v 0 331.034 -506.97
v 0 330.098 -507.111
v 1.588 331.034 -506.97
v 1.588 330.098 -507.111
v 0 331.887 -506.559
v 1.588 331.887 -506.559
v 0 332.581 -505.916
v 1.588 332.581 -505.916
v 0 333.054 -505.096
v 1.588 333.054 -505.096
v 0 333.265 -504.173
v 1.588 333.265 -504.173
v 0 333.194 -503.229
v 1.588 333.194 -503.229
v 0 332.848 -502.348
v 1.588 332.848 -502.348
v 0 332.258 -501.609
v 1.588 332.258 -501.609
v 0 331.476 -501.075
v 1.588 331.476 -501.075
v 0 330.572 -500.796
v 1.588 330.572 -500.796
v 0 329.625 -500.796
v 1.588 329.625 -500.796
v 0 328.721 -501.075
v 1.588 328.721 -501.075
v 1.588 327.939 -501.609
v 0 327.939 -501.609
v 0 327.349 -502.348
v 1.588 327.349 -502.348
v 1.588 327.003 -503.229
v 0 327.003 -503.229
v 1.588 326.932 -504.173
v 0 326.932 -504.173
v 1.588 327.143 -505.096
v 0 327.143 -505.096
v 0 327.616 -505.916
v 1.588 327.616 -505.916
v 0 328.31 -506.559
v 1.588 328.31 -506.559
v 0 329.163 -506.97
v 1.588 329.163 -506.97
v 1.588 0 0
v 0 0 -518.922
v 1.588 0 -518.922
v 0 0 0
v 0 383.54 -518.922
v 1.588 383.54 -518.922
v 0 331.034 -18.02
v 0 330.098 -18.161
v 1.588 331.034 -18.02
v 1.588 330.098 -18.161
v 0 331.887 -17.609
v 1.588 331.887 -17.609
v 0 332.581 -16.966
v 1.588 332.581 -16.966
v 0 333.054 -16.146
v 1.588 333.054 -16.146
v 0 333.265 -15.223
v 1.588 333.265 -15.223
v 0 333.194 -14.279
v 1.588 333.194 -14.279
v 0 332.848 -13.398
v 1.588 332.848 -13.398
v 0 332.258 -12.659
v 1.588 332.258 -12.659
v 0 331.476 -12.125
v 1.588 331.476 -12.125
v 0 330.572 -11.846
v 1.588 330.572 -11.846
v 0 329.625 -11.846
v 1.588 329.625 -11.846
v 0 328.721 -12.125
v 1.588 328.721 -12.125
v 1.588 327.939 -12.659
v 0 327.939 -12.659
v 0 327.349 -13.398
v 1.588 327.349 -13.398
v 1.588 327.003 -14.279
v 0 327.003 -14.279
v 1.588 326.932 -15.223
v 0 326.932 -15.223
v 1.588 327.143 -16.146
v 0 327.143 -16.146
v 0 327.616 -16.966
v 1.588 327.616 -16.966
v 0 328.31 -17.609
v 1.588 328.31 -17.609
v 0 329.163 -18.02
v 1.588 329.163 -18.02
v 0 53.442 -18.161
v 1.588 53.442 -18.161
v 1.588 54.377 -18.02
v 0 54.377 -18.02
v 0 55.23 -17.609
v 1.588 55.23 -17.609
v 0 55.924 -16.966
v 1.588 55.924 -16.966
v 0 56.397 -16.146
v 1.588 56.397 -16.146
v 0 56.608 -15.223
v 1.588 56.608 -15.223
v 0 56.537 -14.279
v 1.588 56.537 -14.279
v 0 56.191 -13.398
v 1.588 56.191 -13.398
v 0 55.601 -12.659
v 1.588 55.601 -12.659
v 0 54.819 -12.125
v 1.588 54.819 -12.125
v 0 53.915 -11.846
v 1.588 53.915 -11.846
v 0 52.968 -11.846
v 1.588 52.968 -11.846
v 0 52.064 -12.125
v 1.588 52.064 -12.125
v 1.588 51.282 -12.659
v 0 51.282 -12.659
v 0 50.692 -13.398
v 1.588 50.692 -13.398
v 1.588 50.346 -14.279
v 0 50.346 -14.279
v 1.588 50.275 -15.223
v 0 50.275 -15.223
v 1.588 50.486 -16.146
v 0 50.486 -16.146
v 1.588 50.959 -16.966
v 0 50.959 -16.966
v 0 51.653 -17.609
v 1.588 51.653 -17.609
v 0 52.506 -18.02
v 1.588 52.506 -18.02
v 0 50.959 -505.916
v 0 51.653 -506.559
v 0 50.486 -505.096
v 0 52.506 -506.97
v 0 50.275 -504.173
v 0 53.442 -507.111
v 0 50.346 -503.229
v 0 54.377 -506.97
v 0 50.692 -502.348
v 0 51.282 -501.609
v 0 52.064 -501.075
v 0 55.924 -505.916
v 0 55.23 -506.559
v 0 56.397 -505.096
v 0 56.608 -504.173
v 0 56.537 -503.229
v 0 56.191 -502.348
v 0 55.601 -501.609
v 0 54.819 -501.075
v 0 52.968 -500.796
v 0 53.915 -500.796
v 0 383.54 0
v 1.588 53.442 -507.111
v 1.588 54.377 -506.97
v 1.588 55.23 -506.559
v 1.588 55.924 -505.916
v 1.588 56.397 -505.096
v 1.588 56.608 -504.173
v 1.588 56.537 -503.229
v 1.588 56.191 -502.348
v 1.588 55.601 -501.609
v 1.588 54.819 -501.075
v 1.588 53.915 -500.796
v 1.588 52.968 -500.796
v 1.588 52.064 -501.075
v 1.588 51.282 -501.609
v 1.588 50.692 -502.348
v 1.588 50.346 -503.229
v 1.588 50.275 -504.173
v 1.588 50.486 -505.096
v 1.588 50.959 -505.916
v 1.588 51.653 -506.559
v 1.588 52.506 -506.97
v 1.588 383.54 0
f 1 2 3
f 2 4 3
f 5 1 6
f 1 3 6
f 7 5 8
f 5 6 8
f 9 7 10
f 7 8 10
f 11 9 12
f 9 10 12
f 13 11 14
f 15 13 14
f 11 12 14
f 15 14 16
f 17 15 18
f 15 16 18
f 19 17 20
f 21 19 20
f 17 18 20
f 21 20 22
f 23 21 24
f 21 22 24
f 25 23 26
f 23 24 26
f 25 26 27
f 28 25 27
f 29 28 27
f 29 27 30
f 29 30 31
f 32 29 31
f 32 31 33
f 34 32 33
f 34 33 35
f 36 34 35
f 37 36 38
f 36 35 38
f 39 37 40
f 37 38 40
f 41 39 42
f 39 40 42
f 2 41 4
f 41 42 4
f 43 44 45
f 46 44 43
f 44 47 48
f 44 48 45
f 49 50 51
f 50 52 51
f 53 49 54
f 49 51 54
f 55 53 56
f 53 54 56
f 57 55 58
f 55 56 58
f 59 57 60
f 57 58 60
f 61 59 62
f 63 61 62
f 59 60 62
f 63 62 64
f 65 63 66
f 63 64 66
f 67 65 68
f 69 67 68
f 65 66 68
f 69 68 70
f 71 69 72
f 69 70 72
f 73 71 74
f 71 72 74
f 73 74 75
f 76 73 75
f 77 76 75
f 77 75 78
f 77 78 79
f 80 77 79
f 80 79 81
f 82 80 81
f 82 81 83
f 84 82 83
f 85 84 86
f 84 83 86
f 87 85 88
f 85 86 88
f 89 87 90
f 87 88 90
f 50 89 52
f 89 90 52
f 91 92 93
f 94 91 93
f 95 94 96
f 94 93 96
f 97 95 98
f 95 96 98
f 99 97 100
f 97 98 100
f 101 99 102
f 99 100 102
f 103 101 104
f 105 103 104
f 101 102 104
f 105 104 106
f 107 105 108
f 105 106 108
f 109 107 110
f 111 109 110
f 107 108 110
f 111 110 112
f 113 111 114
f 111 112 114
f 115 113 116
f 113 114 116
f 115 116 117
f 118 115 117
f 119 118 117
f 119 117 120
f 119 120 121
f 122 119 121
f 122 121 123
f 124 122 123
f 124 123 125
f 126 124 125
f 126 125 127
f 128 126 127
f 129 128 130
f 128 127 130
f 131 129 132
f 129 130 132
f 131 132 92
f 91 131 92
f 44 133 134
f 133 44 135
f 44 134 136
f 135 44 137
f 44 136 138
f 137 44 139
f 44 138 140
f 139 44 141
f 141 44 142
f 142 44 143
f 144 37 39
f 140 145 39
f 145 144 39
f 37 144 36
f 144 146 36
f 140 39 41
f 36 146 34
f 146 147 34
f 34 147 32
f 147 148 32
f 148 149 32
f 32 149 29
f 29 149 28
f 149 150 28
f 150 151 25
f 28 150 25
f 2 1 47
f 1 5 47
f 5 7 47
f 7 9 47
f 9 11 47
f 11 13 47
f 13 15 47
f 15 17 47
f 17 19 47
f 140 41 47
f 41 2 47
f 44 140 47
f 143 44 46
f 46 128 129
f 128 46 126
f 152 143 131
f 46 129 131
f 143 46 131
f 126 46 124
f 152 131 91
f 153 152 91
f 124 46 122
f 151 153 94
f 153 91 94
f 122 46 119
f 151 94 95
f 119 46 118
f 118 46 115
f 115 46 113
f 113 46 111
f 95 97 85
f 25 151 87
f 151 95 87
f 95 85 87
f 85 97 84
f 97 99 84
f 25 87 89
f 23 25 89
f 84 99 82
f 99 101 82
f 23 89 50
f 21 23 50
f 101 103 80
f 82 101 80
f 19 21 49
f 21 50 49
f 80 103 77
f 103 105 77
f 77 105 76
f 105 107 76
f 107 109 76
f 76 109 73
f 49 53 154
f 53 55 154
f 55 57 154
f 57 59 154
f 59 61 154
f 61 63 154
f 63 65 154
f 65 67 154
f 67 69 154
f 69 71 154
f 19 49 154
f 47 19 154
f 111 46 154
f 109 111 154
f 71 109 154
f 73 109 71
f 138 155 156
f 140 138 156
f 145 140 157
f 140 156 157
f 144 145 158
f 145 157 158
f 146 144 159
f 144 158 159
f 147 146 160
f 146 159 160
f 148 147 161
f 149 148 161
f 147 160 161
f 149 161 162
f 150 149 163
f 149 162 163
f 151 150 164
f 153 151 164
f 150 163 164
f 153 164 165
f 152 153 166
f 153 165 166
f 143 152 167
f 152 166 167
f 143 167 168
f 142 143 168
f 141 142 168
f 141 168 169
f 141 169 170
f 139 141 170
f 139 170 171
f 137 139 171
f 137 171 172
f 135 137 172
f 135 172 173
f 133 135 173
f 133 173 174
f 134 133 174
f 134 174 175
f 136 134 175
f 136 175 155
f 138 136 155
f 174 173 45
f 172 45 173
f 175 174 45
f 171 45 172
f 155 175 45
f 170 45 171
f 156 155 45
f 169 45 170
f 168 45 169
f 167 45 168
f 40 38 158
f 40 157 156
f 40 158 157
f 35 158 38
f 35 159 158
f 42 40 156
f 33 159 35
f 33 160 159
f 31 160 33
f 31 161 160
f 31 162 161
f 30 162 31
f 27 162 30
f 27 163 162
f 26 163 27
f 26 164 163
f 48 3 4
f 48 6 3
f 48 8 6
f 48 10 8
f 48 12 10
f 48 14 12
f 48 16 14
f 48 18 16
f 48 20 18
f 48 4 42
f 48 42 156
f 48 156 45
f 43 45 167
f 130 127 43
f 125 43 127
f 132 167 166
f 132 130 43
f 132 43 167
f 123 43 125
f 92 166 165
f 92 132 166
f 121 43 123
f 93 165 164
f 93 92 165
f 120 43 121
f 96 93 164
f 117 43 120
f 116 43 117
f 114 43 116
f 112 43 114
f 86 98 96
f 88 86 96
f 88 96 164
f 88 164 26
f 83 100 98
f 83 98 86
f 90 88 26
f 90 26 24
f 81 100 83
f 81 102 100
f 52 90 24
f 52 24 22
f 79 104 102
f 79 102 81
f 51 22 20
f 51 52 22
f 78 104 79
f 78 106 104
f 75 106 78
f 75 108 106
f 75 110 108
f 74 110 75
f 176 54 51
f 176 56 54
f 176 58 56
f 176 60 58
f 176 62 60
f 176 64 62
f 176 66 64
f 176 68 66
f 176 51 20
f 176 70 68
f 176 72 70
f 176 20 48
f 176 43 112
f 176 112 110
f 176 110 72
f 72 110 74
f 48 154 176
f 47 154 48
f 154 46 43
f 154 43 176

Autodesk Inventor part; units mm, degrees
ref_plane "YZ Plane" through (0, 0, 0) normal (1, 0, 0) x (0, 1, 0)
ref_plane "XZ Plane" through (0, 0, 0) normal (0, 1, 0) x (-1, 0, 0)
ref_plane "XY Plane" through (0, 0, 0) normal (0, 0, 1) x (1, 0, 0)
sketch "Sketch1" plane through (0, 0, 0) normal (1, 0, 0) x (0, 1, 0)
  line L0 (0, 0) -> (383.54, 0)
  line L1 (383.54, 0) -> (383.54, -518.922)
  line L2 (383.54, -518.922) -> (0, -518.922)
  line L3 (0, -518.922) -> (0, 0)
  dimension "d0" = 383.54
  dimension "d1" = 518.922
extrude "Extrusion1" add sketch "Sketch1" along normal blind 1.5875
sketch "Sketch2" plane through (1.5875, 0, 0) normal (1, 0, 0) x (0, 0, -1)
  line L0 (0, 191.77) -> (105.6706, 191.77)
  line L1 (0, 0) -> (518.922, 0) projected
  line L2 (259.461, 0) -> (259.461, 125.3156)
  line L3 (259.461, 383.54) -> (259.461, 258.2244)
  circle A0 centre (14.986, 53.4416) radius 3.175
  line L4 (518.922, 191.77) -> (413.2514, 191.77)
  circle A1 centre (503.936, 53.4416) radius 3.175
  circle A2 centre (14.986, 330.0984) radius 3.175
  circle A3 centre (503.936, 330.0984) radius 3.175
  dimension "d15" = 6.35
extrude "Extrusion4" cut sketch "Sketch2" against normal blind 25.4
properties part number "TopV4"
